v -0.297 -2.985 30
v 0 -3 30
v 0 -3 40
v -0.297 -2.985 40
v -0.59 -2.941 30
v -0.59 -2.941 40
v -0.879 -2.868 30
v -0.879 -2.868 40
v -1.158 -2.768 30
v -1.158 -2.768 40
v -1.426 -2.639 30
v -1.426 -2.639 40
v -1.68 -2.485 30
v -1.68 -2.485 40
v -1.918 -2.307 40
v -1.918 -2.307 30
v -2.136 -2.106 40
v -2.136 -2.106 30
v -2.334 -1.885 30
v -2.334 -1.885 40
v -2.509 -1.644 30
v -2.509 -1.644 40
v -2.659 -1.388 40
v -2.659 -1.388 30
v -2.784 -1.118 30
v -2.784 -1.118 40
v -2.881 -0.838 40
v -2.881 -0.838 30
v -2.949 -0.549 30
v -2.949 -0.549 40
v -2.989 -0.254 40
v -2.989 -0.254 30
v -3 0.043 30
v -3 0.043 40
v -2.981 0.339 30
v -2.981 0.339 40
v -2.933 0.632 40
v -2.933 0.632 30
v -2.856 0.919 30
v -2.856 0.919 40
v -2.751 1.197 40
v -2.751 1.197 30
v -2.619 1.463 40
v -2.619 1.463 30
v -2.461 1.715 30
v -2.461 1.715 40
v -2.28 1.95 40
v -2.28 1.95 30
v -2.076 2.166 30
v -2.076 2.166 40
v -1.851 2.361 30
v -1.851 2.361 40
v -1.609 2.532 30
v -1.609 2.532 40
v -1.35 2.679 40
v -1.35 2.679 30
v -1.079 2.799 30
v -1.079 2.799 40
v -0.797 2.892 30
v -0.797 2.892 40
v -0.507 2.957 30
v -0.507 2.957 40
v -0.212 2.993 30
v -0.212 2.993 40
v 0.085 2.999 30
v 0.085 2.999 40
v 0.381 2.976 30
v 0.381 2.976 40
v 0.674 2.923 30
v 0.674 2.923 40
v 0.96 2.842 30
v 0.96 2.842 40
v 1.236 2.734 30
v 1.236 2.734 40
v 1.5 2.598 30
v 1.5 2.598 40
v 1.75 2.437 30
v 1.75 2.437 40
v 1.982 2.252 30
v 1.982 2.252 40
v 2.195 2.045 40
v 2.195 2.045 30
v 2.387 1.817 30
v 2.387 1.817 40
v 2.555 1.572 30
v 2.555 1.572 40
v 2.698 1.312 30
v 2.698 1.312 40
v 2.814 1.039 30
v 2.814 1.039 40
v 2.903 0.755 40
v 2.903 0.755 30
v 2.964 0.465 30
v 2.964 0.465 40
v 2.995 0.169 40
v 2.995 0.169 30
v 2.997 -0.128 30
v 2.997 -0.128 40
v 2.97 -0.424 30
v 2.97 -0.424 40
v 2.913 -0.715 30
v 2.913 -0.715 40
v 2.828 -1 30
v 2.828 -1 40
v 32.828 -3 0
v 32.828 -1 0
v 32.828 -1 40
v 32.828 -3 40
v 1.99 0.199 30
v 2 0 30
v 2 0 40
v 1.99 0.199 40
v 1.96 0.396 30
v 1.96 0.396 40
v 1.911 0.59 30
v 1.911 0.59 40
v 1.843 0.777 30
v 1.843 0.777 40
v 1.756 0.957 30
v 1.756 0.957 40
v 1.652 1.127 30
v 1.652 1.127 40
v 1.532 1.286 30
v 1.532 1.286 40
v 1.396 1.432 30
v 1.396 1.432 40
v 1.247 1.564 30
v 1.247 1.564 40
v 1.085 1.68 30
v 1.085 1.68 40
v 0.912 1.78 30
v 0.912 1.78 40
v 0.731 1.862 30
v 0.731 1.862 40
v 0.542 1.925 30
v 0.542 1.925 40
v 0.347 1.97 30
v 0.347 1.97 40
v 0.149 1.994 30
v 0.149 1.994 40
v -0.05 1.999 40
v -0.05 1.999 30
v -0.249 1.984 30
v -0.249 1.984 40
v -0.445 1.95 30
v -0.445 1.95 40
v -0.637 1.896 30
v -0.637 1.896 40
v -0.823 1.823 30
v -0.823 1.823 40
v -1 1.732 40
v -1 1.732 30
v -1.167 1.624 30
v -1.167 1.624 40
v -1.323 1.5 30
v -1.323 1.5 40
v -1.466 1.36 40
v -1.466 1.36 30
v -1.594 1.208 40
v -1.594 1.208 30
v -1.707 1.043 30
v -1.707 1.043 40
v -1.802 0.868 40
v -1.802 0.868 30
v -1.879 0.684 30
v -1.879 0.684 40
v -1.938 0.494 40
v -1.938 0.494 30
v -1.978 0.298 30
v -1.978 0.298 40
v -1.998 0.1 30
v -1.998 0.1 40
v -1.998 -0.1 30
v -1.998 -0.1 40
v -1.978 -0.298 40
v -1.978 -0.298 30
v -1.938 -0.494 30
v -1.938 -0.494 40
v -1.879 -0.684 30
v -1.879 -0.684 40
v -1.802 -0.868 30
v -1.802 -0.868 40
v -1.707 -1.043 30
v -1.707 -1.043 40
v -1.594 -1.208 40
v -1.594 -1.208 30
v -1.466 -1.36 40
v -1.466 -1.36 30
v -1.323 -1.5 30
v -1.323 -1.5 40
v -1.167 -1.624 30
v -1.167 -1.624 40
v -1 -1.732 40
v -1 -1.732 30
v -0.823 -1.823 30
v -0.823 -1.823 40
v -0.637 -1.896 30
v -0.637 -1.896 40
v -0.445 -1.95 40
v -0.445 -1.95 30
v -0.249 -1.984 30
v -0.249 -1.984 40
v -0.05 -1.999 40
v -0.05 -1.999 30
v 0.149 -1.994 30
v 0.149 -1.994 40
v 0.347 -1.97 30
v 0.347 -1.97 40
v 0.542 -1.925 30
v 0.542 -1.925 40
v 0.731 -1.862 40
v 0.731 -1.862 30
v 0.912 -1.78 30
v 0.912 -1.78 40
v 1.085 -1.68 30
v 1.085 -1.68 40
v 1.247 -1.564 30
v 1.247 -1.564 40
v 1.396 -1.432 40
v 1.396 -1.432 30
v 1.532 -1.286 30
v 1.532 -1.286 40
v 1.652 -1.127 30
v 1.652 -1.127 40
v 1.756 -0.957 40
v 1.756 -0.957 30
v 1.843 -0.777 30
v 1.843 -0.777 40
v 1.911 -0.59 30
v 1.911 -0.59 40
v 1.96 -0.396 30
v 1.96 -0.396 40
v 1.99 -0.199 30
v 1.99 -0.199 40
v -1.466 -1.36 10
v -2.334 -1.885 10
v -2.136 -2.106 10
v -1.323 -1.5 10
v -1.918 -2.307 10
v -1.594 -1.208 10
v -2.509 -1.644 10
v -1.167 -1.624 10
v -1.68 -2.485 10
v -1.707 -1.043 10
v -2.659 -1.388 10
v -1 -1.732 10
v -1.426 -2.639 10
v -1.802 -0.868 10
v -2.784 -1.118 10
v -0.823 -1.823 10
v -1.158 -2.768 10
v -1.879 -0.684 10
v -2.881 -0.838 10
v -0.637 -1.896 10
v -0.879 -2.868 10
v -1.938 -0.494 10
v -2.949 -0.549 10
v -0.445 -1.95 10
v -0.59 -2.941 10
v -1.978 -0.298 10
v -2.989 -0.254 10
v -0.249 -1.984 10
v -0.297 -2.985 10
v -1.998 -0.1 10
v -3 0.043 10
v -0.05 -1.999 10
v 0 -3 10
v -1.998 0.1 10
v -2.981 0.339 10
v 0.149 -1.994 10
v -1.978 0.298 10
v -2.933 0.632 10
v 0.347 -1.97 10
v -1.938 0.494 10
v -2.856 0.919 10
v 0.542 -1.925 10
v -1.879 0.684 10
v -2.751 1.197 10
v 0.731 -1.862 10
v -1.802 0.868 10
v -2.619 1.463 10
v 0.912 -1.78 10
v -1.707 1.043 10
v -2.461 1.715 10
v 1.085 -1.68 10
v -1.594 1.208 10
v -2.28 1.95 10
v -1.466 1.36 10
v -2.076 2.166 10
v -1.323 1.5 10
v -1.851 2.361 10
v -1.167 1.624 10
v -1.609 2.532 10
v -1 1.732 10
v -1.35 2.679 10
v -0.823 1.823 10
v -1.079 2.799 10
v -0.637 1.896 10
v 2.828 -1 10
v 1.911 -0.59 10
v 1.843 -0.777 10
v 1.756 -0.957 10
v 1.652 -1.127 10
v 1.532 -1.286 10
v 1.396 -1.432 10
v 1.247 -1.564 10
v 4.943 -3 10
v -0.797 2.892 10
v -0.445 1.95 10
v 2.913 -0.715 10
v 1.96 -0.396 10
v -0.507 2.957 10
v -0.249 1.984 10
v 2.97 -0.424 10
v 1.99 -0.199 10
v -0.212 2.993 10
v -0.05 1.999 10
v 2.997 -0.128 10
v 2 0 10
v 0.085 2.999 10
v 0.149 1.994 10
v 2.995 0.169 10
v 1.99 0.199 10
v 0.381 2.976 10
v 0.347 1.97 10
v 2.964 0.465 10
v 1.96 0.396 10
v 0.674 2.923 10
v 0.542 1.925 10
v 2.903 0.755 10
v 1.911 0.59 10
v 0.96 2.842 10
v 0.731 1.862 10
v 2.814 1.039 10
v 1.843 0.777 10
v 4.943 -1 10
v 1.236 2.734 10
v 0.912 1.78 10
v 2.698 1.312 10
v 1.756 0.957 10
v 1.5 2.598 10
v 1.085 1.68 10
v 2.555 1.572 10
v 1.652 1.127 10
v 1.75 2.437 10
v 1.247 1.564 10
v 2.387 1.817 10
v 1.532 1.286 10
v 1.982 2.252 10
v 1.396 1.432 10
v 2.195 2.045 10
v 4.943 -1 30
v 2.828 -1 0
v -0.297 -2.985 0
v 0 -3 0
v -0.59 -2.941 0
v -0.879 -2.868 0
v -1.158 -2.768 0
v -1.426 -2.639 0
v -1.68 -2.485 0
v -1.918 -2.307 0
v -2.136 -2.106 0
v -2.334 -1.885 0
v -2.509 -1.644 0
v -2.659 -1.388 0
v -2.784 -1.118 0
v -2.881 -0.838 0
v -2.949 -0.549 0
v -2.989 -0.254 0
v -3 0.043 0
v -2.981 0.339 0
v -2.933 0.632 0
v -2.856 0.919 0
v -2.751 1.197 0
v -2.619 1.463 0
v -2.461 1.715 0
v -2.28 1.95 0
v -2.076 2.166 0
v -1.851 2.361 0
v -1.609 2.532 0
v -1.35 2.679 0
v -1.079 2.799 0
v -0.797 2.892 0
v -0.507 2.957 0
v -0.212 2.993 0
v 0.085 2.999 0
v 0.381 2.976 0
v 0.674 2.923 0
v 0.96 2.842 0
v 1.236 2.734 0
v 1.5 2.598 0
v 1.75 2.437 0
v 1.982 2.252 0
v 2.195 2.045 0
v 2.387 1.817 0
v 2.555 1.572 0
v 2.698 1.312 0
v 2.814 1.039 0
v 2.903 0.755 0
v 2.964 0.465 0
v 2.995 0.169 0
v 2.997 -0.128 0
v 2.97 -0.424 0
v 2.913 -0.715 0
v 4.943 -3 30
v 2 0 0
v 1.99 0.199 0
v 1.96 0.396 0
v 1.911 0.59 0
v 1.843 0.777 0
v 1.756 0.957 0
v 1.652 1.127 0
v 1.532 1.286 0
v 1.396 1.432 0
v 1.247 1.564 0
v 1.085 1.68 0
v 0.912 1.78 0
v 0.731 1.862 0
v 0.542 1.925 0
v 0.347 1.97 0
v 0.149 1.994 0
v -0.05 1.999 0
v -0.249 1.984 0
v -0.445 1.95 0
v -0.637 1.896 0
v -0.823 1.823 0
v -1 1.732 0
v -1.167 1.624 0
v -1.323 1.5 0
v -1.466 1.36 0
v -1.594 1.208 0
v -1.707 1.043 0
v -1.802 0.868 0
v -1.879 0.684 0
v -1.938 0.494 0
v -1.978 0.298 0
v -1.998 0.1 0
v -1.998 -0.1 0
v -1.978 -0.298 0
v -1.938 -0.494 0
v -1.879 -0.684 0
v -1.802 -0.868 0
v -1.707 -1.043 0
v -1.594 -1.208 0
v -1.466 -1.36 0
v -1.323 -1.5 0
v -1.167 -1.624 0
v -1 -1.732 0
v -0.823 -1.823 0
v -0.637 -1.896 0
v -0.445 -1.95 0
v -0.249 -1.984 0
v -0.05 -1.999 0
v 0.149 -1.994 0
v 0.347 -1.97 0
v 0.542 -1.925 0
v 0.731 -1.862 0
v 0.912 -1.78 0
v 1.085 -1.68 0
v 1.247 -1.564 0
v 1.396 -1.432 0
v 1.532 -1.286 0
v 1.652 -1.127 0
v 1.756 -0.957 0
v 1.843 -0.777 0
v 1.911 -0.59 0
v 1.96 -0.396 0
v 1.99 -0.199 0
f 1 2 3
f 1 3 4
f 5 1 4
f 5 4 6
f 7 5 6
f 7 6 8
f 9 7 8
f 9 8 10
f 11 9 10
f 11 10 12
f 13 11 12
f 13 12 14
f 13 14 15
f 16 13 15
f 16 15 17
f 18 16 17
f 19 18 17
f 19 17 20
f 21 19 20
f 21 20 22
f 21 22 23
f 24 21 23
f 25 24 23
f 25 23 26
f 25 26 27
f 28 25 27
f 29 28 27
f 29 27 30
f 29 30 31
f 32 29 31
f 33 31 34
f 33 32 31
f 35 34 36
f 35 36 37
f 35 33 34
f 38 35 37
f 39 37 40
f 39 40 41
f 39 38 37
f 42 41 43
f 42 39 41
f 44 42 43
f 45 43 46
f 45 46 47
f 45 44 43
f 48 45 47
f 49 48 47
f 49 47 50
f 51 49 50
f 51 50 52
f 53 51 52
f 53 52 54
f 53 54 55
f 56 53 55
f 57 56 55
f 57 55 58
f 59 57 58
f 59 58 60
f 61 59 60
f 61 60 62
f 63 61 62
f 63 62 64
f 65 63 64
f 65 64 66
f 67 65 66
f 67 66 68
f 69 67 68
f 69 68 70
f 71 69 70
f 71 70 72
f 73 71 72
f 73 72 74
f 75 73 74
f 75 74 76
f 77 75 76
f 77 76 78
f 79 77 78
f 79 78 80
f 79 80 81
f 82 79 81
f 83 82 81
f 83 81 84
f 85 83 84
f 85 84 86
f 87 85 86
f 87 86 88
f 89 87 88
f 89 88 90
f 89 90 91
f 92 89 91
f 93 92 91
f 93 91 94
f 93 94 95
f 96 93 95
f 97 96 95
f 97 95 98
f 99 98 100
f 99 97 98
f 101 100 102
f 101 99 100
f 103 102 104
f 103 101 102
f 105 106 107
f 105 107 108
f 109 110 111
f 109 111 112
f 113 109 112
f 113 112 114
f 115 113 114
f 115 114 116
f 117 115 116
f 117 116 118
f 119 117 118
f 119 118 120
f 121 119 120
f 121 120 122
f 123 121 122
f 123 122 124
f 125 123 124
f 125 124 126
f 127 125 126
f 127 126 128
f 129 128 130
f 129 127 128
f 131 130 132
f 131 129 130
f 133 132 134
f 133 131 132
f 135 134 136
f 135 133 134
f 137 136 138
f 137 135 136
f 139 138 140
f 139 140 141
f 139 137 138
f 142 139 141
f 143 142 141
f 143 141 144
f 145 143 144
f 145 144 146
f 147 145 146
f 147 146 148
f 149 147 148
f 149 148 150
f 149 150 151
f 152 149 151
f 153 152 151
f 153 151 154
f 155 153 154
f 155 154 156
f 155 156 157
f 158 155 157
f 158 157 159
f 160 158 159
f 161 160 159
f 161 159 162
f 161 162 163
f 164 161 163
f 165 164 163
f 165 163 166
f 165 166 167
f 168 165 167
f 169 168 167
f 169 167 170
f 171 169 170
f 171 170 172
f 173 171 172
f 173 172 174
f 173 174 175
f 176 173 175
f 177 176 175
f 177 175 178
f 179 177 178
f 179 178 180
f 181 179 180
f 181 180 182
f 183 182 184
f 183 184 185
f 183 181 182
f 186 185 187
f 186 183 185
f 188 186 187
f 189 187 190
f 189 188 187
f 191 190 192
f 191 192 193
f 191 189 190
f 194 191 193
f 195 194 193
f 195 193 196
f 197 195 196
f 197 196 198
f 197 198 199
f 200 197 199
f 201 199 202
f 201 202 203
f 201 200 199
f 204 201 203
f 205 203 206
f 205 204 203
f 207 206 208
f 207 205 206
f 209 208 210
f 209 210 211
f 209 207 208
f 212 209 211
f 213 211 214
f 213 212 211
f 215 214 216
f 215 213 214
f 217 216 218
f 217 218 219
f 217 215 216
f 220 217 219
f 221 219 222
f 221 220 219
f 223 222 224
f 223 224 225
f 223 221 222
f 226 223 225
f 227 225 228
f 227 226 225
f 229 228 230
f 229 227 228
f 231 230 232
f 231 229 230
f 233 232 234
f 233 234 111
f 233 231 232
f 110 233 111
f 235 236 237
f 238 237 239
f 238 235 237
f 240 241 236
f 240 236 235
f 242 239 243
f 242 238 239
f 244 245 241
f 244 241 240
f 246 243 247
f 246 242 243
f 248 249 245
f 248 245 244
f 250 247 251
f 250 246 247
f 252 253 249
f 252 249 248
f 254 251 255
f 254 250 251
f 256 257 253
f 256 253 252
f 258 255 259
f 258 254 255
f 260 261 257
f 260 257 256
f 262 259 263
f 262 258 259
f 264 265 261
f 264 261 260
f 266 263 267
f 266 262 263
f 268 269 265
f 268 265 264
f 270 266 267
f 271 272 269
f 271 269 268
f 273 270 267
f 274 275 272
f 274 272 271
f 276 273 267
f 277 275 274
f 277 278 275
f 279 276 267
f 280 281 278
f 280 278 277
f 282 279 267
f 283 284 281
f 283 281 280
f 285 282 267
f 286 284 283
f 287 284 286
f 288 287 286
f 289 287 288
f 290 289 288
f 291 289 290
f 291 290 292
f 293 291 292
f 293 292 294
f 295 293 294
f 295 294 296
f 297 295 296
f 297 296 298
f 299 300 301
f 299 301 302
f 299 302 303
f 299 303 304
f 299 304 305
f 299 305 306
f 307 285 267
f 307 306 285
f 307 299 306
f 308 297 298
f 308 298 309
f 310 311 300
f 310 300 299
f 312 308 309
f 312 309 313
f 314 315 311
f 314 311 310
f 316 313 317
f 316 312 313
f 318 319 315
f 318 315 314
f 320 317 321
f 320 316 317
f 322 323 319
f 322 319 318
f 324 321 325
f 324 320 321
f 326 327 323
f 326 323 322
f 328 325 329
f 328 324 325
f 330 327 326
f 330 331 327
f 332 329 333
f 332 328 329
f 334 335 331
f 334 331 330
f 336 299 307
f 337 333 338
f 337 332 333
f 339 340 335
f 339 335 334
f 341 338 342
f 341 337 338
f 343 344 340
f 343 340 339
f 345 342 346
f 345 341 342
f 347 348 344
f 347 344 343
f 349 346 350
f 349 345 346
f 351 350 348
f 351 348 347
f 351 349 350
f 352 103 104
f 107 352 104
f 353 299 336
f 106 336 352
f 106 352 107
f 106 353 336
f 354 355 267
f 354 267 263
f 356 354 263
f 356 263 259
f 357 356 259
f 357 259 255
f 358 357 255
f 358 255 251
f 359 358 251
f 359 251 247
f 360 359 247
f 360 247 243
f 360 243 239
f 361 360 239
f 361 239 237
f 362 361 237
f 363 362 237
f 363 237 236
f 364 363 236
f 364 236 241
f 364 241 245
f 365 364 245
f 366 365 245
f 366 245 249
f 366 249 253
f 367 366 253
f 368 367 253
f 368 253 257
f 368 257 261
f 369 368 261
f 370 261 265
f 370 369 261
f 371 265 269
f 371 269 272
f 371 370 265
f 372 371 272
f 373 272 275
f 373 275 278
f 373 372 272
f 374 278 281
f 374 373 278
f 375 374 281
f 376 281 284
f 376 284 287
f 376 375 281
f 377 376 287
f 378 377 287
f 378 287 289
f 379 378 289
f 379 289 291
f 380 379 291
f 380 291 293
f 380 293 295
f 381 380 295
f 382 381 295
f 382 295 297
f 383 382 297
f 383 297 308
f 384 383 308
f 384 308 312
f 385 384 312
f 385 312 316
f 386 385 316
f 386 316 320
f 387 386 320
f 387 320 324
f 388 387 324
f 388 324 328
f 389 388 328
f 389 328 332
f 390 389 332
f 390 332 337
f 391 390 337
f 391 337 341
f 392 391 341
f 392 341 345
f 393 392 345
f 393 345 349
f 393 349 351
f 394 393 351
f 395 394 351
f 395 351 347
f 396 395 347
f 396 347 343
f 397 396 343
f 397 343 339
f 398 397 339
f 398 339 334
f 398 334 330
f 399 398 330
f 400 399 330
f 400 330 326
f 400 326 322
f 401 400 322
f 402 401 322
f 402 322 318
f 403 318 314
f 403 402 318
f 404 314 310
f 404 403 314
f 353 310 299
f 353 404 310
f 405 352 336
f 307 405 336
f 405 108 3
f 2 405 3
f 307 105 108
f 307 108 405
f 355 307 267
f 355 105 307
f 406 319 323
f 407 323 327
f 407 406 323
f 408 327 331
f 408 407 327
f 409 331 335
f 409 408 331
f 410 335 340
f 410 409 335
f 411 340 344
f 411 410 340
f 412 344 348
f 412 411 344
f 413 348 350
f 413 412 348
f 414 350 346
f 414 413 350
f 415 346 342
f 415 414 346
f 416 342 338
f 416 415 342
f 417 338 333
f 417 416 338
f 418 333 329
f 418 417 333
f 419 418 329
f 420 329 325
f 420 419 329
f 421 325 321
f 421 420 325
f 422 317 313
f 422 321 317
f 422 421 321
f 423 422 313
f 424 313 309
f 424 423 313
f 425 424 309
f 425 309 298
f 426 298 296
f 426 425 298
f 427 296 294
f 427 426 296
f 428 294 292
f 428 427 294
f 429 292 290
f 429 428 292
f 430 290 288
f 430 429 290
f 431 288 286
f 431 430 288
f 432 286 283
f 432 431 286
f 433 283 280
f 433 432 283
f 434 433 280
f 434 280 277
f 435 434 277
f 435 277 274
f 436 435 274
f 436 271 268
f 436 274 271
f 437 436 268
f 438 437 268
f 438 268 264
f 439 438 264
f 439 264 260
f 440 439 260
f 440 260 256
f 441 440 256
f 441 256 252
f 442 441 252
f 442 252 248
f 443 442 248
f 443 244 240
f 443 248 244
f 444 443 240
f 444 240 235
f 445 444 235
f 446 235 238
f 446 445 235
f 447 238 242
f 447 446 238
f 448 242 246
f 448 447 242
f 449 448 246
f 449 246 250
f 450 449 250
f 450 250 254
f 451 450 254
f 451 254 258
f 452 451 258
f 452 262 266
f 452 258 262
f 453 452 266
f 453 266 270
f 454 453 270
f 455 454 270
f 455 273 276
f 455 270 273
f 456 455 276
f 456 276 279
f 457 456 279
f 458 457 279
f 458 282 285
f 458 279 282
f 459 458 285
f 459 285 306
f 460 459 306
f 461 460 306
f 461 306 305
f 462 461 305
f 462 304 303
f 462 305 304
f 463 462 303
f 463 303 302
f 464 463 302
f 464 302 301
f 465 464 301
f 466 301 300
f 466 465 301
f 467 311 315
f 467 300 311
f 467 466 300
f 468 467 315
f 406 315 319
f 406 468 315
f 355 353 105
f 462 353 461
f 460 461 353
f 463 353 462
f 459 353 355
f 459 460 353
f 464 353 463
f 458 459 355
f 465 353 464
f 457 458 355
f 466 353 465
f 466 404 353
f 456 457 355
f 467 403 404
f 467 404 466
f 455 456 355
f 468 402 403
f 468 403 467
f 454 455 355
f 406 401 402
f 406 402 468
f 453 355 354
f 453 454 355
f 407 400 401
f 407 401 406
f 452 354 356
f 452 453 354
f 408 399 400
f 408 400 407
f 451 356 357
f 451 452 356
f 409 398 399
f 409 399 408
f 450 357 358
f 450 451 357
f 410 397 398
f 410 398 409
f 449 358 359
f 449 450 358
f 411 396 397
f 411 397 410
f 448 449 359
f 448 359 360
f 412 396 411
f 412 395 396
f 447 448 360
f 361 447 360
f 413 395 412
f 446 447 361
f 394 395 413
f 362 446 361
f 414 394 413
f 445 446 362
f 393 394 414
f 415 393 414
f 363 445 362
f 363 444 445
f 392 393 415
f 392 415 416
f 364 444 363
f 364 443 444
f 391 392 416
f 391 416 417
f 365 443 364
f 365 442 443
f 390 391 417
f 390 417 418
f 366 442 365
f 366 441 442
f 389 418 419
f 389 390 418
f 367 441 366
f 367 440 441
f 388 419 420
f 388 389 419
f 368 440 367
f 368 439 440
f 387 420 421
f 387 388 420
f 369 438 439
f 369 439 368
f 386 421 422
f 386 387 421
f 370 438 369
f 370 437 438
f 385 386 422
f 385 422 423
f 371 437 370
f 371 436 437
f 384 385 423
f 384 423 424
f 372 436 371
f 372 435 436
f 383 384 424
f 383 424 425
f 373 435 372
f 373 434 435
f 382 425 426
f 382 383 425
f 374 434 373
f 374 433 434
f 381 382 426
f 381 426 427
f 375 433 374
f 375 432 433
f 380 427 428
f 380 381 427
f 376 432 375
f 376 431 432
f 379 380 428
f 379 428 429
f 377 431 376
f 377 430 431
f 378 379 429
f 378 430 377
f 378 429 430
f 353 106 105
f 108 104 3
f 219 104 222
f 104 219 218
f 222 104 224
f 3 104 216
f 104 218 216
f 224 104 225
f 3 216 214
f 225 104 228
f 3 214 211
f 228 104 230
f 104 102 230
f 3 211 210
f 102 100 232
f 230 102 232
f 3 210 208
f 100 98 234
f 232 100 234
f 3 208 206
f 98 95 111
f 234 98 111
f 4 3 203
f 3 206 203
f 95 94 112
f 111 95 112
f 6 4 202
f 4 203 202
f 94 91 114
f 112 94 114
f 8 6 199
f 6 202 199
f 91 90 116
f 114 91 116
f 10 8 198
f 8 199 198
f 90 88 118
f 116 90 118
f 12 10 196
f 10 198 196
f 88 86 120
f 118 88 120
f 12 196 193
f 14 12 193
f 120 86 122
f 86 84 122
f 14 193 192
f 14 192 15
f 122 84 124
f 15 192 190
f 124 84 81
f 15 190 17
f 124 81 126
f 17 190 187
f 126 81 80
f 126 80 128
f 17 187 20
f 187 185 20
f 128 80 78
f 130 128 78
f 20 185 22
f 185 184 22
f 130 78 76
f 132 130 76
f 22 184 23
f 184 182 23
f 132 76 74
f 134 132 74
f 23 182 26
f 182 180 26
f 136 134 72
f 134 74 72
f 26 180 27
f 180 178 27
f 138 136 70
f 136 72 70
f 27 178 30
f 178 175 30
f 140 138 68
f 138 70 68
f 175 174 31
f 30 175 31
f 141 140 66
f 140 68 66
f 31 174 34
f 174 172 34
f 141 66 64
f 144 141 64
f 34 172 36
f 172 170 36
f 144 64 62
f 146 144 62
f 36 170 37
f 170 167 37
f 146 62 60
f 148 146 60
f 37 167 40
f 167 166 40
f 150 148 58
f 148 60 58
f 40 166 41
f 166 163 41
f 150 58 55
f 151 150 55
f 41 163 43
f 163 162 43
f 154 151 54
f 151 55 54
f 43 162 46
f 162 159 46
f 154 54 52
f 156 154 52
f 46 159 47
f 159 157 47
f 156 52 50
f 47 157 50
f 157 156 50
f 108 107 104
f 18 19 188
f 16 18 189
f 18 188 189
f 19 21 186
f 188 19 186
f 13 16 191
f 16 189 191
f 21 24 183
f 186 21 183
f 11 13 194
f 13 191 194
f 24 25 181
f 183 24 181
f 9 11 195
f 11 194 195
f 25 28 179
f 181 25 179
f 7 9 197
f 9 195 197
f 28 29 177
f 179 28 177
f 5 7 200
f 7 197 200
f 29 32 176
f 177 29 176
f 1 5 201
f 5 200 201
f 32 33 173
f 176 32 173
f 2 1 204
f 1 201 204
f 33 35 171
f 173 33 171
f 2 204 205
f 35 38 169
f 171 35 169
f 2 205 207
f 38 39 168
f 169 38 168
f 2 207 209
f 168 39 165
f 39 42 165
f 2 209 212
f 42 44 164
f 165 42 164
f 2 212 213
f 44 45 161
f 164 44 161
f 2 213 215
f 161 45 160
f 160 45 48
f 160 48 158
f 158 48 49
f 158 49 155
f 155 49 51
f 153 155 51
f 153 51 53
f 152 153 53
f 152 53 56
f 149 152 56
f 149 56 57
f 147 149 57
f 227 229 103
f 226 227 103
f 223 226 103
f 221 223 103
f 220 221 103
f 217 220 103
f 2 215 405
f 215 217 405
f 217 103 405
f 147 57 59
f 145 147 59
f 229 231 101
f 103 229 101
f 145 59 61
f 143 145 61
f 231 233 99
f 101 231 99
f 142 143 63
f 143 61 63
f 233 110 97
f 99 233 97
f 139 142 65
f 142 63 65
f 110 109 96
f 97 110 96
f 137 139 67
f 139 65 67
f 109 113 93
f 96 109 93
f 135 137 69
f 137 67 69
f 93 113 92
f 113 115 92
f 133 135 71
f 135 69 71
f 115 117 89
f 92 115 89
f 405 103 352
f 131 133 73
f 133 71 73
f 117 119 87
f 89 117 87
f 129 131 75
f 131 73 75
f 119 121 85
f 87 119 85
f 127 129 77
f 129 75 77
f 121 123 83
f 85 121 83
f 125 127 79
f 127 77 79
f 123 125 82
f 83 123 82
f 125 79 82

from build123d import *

# Parameters (mm, degrees)
SKETCH_1_R          = 2
EXTRUDE_1_DEPTH     = 40
SKETCH_2_W          = 10.776638496
SKETCH_2_H          = 20
CUT_EXTRUDE_2_DEPTH = 20


with BuildPart() as part:
    # Эскиз1 → Вытянуть1 (new body)
    with BuildSketch(Plane.XY):
        with BuildLine():
            Line((2.828427125, -1), (32.828427125, -1))
            Line((32.828427125, -1), (32.828427125, -3))
            Line((32.828427125, -3), (0, -3))
            ThreePointArc((0, -3), (-1.732050808, 2.449489743), (2.828427125, -1))
        make_face()
        Circle(SKETCH_1_R, mode=Mode.SUBTRACT)
    extrude(amount=EXTRUDE_1_DEPTH)

    # Эскиз2 → Вытянуть2 (cut, symmetric)
    with BuildSketch(Plane(origin=(0, 0, 0), x_dir=(1, 0, 0), z_dir=(0, 1, 0))):
        with Locations((-0.445273779, -20)):
            Rectangle(SKETCH_2_W, SKETCH_2_H)
    extrude(amount=CUT_EXTRUDE_2_DEPTH, both=True, mode=Mode.SUBTRACT)


solid = part.part
